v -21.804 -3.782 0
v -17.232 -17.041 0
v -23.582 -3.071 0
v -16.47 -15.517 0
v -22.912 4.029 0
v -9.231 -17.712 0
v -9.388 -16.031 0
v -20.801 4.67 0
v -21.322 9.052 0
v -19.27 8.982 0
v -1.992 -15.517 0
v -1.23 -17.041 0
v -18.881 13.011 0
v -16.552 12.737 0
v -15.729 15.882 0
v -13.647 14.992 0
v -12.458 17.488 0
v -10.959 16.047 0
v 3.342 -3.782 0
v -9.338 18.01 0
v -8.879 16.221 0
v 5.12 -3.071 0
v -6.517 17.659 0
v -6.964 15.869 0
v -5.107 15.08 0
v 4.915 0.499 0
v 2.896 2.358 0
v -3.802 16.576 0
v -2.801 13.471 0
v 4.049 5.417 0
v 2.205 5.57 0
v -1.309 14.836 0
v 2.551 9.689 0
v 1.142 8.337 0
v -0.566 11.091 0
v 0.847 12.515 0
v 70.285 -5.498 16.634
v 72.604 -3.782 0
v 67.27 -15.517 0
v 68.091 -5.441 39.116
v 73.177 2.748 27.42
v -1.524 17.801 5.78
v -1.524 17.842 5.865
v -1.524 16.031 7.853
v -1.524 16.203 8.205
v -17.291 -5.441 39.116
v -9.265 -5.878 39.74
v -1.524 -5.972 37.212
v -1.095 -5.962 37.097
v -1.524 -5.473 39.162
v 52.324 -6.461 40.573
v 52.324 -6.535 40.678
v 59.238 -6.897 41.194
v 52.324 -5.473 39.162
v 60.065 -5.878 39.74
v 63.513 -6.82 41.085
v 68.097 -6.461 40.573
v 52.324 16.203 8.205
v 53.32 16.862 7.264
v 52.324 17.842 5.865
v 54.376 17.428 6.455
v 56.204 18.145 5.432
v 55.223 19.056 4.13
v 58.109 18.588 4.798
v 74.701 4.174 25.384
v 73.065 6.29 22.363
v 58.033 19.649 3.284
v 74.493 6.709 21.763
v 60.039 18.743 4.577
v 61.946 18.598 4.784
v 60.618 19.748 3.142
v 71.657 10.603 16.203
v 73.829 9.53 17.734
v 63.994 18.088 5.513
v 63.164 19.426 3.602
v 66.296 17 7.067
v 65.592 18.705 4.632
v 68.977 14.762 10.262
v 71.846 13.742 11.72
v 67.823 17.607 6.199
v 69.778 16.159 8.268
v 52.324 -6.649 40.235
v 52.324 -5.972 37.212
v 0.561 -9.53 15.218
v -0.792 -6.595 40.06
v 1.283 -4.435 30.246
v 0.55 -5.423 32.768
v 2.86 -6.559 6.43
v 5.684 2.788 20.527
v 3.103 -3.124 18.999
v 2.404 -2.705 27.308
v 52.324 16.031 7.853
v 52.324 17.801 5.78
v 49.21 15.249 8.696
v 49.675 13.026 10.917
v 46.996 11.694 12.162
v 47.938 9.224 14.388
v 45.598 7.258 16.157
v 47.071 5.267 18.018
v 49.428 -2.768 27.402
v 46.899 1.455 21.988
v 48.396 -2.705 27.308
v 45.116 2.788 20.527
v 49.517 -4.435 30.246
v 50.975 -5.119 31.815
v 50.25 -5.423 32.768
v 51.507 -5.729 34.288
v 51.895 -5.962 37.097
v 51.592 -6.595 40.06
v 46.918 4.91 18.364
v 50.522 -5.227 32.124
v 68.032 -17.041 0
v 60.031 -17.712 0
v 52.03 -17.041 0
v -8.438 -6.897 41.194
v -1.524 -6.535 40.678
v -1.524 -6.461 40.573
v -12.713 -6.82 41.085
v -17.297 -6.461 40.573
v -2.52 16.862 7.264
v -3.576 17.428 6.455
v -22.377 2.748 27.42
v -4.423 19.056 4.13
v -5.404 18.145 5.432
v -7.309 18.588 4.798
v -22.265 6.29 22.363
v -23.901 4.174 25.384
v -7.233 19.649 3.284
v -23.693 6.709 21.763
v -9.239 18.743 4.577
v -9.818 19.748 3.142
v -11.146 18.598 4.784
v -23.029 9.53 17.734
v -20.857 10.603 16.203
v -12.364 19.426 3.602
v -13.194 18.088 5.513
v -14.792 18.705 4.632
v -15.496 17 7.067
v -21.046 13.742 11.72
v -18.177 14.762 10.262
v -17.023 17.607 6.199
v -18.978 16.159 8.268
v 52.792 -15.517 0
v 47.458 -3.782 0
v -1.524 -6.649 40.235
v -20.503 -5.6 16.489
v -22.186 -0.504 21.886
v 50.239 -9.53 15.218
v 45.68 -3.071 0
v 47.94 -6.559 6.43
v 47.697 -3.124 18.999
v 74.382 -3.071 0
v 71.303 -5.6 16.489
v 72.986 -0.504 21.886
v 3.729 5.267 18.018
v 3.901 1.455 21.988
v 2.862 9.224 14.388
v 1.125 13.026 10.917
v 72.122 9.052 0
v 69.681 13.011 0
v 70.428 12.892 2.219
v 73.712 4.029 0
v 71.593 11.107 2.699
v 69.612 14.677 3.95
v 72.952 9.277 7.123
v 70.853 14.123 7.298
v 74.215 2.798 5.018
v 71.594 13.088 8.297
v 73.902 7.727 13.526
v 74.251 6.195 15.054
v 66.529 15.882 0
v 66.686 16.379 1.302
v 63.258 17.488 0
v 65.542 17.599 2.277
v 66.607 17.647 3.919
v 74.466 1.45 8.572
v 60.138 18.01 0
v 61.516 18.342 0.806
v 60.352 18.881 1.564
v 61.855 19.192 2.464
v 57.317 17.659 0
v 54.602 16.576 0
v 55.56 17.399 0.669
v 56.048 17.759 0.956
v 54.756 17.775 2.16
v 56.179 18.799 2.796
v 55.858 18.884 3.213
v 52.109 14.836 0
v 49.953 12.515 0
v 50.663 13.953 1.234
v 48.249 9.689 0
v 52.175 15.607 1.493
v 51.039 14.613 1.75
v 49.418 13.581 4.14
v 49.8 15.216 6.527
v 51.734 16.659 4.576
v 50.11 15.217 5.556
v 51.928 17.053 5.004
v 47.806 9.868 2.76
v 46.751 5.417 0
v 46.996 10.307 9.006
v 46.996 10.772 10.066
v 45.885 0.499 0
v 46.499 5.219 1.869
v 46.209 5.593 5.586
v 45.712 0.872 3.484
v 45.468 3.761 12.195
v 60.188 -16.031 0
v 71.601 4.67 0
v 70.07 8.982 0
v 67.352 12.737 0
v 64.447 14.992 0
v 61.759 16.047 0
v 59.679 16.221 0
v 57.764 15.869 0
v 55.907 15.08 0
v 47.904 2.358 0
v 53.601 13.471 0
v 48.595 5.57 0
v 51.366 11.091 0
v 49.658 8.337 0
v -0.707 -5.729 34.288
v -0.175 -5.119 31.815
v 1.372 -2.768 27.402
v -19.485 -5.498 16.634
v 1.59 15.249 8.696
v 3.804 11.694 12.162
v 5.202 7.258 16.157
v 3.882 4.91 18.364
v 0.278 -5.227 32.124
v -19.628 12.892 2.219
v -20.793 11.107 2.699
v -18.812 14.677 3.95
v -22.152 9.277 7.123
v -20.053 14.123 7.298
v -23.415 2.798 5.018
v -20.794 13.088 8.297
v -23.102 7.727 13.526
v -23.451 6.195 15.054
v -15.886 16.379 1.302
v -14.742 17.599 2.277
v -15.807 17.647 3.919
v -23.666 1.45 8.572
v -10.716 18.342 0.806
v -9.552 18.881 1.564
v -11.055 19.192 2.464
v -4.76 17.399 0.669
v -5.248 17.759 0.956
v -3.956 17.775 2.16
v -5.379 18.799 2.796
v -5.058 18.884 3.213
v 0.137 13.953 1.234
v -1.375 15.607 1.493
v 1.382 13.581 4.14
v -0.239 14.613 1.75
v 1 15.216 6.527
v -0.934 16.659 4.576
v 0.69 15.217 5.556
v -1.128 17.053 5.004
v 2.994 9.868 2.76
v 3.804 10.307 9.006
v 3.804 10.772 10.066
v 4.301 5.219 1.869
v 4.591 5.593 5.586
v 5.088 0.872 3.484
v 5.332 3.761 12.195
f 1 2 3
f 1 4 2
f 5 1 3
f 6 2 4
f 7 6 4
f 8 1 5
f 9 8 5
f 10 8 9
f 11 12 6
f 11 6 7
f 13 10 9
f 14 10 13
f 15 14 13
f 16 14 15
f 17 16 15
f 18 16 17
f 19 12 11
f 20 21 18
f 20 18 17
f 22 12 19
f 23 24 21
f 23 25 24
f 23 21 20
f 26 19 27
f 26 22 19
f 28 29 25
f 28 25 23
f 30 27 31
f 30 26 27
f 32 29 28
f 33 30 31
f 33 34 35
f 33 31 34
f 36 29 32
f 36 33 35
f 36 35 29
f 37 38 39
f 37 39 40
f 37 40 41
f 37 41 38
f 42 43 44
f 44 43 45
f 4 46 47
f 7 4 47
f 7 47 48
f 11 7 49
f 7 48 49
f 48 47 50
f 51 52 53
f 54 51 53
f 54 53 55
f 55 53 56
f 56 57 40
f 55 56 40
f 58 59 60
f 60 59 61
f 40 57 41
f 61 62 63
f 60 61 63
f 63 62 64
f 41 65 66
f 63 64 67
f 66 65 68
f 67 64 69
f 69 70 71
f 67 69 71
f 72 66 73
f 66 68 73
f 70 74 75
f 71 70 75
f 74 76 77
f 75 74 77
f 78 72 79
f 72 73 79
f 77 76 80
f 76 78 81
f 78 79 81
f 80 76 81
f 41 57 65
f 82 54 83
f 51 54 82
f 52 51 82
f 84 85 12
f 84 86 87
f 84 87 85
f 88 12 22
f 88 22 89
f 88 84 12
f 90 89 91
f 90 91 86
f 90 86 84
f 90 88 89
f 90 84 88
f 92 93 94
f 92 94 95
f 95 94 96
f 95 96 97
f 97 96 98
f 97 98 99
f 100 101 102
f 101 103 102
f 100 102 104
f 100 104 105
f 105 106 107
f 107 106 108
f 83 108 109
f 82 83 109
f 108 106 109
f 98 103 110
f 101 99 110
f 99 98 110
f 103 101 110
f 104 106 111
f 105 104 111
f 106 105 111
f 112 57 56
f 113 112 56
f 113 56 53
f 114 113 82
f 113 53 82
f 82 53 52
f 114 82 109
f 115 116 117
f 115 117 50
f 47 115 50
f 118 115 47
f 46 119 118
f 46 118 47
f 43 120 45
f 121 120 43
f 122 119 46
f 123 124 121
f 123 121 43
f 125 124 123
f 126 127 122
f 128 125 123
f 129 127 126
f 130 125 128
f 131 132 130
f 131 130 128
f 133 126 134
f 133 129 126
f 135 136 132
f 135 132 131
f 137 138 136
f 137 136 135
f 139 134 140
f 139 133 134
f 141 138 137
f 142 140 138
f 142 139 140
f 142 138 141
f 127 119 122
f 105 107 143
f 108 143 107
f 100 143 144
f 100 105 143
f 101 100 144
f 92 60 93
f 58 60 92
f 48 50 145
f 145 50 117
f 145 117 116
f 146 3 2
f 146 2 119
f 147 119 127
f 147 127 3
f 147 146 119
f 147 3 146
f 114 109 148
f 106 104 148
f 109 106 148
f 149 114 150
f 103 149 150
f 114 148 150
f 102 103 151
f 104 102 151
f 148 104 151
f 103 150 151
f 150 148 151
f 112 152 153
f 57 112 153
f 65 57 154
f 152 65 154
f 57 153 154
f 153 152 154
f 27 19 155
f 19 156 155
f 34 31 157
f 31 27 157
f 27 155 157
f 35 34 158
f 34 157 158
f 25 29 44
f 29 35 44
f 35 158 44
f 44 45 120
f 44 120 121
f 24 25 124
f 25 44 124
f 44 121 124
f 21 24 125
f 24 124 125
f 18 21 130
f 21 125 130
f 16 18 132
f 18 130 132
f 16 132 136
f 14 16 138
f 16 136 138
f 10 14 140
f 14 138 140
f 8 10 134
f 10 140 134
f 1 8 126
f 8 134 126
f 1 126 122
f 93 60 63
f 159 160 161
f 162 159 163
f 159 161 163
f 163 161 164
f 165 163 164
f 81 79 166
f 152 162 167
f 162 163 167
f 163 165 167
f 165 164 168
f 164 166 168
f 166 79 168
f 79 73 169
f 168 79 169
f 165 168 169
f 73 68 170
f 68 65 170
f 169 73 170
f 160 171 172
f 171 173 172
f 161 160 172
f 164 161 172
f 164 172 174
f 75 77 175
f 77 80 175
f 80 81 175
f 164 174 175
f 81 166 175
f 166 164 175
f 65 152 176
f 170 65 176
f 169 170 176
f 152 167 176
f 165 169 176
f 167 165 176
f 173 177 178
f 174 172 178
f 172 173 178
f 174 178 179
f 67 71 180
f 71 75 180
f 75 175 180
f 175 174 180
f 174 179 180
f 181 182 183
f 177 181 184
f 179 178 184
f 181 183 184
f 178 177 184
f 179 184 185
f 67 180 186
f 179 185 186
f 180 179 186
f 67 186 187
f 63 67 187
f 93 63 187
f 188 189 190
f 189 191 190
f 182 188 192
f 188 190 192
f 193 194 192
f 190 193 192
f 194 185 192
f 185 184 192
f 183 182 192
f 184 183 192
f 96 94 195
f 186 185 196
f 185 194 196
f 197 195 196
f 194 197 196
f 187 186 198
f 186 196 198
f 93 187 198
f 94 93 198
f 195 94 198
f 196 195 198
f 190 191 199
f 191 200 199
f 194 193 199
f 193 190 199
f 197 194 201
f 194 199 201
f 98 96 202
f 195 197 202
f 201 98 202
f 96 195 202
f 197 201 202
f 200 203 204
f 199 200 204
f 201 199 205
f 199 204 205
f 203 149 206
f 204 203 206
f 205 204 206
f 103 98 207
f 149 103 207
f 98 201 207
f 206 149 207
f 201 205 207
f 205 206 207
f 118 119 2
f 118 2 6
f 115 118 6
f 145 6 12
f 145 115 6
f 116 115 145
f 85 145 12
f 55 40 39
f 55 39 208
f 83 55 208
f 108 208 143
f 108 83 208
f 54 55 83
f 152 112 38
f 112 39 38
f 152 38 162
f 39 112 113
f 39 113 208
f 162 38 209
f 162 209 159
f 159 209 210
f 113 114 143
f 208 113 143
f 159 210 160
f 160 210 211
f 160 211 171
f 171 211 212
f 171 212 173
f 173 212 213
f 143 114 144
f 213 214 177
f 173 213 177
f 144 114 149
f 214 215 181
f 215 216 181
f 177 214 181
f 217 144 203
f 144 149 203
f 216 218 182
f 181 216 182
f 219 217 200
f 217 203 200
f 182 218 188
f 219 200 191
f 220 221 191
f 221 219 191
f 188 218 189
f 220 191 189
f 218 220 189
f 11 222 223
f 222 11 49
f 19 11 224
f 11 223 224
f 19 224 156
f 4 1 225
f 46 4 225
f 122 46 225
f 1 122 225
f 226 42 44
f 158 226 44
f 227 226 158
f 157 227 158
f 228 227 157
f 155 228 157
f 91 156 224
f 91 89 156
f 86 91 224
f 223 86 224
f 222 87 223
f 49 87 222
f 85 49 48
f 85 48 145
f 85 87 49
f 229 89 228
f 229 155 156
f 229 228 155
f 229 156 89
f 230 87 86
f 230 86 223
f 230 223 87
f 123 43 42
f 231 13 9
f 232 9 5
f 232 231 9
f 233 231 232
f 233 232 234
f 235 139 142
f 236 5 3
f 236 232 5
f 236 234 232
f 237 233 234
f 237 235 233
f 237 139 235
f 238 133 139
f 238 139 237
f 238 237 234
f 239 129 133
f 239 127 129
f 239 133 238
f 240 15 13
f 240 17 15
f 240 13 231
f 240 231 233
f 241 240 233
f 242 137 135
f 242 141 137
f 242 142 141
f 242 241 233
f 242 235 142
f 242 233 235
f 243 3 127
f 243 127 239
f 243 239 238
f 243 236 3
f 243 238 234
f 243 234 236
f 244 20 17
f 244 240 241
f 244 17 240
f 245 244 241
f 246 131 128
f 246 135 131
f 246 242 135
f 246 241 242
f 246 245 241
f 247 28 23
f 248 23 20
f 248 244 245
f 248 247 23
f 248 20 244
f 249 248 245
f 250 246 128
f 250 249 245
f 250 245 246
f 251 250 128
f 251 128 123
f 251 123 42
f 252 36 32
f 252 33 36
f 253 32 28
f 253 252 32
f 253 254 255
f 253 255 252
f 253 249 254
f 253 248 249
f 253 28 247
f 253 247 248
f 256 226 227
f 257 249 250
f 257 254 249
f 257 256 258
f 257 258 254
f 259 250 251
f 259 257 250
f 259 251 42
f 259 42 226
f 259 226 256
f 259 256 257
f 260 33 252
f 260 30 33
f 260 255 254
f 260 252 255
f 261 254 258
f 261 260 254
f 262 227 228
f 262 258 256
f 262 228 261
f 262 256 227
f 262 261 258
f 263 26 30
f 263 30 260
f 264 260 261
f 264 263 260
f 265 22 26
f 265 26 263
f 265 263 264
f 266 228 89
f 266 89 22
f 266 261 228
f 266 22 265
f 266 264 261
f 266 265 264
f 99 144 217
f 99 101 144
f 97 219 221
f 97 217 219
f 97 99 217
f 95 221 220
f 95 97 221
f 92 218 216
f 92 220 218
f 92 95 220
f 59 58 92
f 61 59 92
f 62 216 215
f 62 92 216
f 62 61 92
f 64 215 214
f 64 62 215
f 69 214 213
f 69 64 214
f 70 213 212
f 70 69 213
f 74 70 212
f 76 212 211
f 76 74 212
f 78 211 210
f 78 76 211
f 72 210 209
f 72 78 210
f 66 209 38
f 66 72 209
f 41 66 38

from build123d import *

# Parameters (mm, degrees)
F9_DEPTH = 26.924


with BuildPart() as f3:
    # F0 (on Top) → F3 section 0
    with BuildSketch(Plane.XY):
        with BuildLine():
            add(Edge.make_bspline(
                [(-17.2318438232, -17.0410163701), (-14.4505438232, -17.3762887716), (-9.2308438232, -18.0468335748), (-4.0111438232, -17.3762887716), (-1.2298438232, -17.0410163701)],
                knots=[0, 0, 0, 0, 0.5, 1, 1, 1, 1], degree=3))
            Line((-1.2298438232, -17.0410163701), (5.1201561768, -3.0710163701))
            add(Edge.make_bspline(
                [(-23.5818438232, -3.0710163701), (-23.739094541, -0.365056948), (-22.6088271258, 11.9545659781), (-9.2494721641, 21.012276346), (4.221704481, 12.0539108059), (5.1280701966, -0.597213455), (5.1201561768, -3.0710163701)],
                knots=[0, 0, 0, 0, 0.2501731306, 0.5, 0.7498268694, 1, 1, 1, 1], degree=3))
            Line((-23.5818438232, -3.0710163701), (-17.2318438232, -17.0410163701))
        make_face()
    # F2 (on line) → F3 section 1
    with BuildSketch(Plane(origin=(0, 14.7273180684, 10.3121791291), x_dir=(-1, 0, 0), z_dir=(0, 0.8191520443, 0.5735764364))):
        with BuildLine():
            Line((0.7867354634, 36.9411537644), (-5.8172645366, 18.3991537644))
            add(Edge.make_bspline(
                [(-5.8172645366, 18.3991537644), (-5.8172645366, 12.5643463727), (-3.7117618737, -3.0834761352), (9.2137705416, -11.2720218157), (21.6924461149, -3.0168785507), (23.9007354634, 12.5643463727), (23.9007354634, 18.3991537644)],
                knots=[0, 0, 0, 0, 0.2824138503, 0.5010306901, 0.7175861497, 1, 1, 1, 1], degree=3))
            Line((23.9007354634, 18.3991537644), (17.2967354634, 36.9411537644))
            add(Edge.make_bspline(
                [(0.7867354634, 36.9411537644), (3.9652762833, 37.5130314247), (8.7332178938, 37.8829722726), (14.3212476441, 37.5340772733), (17.2967354634, 36.9411537644)],
                knots=[0, 0, 0, 0, 0.4954896958, 1, 1, 1, 1], degree=3))
        make_face()
    loft()

    # F4 (on Top) → F6 section 0
    with BuildSketch(Plane.XY):
        with BuildLine():
            Line((-21.8038438232, -3.7822163701), (-16.4698438232, -15.5170163701))
            add(Edge.make_bspline(
                [(-16.4698438232, -15.5170163701), (-14.1050599772, -15.8301115392), (-9.3986568944, -16.2305407119), (-4.6395059533, -15.8344175103), (-1.9918438232, -15.5170163701)],
                knots=[0, 0, 0, 0, 0.4921229468, 1, 1, 1, 1], degree=3))
            Line((-1.9918438232, -15.5170163701), (3.3421561768, -3.7822163701))
            add(Edge.make_bspline(
                [(-21.8038438232, -3.7822163701), (-21.4931708929, -0.037470309), (-21.2885406673, 9.6626340155), (-9.2080117476, 19.5288708791), (2.7343327321, 9.4477169794), (3.2213539996, 0.4783610786), (3.3421561768, -3.7822163701)],
                knots=[0, 0, 0, 0, 0.2532208785, 0.5, 0.7467791215, 1, 1, 1, 1], degree=3))
        make_face()
    # F5 (on line) → F6 section 1
    with BuildSketch(Plane(origin=(0, 14.7273180684, 10.3121791291), x_dir=(-1, 0, 0), z_dir=(0, 0.8191520443, 0.5735764364))):
        with BuildLine():
            Line((22.3767354634, 20.8848653279), (17.2913176641, 35.1631537644))
            add(Edge.make_bspline(
                [(17.2913176641, 35.1631537644), (14.5265273432, 35.5039973924), (8.8343900935, 36.3654533862), (3.7333560275, 35.4674586455), (1.0461532627, 35.1631537644)],
                knots=[0, 0, 0, 0, 0.5084885362, 1, 1, 1, 1], degree=3))
            Line((1.0461532627, 35.1631537644), (-4.0392645366, 20.8848653279))
            add(Edge.make_bspline(
                [(22.3767354634, 20.8848653279), (22.9848253963, 15.8104892947), (20.0409746065, -1.6660183303), (9.2621321012, -9.292251283), (-2.2852094296, -1.2917615595), (-4.2869037468, 14.2560549708), (-4.0392645366, 20.8848653279)],
                knots=[0, 0, 0, 0, 0.2926229093, 0.4990946957, 0.7077133178, 1, 1, 1, 1], degree=3))
        make_face()
    loft(mode=Mode.SUBTRACT)

    # F8 (on offset) → F9 (cut)
    with BuildSketch(Plane.YZ.offset(25.4)):
        with BuildLine():
            add(Edge.make_bspline(
                [(4.1739970203, 25.3838835484), (4.4208796852, 25.0312985627), (5.217436514, 23.8936975153), (6.9298831226, 21.4480703046), (9.1712114563, 18.2471217124), (11.4528207433, 14.9886459569), (13.2361240313, 12.4418249208), (14.6268644003, 10.4556418349), (15.7667606293, 8.8277013077), (16.781809073, 7.378061896), (17.7394066922, 6.0104707649), (18.4721337498, 4.9640280781), (18.9121248119, 4.3356557197), (19.0263652277, 4.1725034976)],
                knots=[0, 0, 0, 0, 1.291280373, 4.1662633525, 8.9566786572, 13.0141904769, 16.0998565534, 18.2839618664, 20.2882359965, 22.0619018364, 23.5930107364, 25.2967974982, 25.8943137586, 25.8943137586, 25.8943137586, 25.8943137586], degree=3))
            Line((4.1739970203, 25.3838835484), (-6.4612572625, 40.5726007536))
            Line((-6.4612572625, 40.5726007536), (-6.8984349978, 41.1969552649))
            add(Edge.make_bspline(
                [(19.0263652277, 4.1725034976), (14.7374845788, 10.0950972506), (4.8928253189, 17.1212957223), (-6.4388278411, 31.3510426763), (-5.6003234099, 37.7186033053), (-6.8381553258, 40.6450309359), (-6.8984349978, 41.1969552649)],
                knots=[0.0194184477, 0.0194184477, 0.0194184477, 0.0194184477, 0.3551233547, 0.6733531725, 0.8631389398, 1, 1, 1, 1], degree=3))
        make_face()
    extrude(amount=-F9_DEPTH, mode=Mode.SUBTRACT)


with BuildPart() as f10_1:
    # F10: instance of F3
    add(f3.part.mirror(Plane.YZ.offset(25.4)))


solid = Compound([f3.part, f10_1.part])
